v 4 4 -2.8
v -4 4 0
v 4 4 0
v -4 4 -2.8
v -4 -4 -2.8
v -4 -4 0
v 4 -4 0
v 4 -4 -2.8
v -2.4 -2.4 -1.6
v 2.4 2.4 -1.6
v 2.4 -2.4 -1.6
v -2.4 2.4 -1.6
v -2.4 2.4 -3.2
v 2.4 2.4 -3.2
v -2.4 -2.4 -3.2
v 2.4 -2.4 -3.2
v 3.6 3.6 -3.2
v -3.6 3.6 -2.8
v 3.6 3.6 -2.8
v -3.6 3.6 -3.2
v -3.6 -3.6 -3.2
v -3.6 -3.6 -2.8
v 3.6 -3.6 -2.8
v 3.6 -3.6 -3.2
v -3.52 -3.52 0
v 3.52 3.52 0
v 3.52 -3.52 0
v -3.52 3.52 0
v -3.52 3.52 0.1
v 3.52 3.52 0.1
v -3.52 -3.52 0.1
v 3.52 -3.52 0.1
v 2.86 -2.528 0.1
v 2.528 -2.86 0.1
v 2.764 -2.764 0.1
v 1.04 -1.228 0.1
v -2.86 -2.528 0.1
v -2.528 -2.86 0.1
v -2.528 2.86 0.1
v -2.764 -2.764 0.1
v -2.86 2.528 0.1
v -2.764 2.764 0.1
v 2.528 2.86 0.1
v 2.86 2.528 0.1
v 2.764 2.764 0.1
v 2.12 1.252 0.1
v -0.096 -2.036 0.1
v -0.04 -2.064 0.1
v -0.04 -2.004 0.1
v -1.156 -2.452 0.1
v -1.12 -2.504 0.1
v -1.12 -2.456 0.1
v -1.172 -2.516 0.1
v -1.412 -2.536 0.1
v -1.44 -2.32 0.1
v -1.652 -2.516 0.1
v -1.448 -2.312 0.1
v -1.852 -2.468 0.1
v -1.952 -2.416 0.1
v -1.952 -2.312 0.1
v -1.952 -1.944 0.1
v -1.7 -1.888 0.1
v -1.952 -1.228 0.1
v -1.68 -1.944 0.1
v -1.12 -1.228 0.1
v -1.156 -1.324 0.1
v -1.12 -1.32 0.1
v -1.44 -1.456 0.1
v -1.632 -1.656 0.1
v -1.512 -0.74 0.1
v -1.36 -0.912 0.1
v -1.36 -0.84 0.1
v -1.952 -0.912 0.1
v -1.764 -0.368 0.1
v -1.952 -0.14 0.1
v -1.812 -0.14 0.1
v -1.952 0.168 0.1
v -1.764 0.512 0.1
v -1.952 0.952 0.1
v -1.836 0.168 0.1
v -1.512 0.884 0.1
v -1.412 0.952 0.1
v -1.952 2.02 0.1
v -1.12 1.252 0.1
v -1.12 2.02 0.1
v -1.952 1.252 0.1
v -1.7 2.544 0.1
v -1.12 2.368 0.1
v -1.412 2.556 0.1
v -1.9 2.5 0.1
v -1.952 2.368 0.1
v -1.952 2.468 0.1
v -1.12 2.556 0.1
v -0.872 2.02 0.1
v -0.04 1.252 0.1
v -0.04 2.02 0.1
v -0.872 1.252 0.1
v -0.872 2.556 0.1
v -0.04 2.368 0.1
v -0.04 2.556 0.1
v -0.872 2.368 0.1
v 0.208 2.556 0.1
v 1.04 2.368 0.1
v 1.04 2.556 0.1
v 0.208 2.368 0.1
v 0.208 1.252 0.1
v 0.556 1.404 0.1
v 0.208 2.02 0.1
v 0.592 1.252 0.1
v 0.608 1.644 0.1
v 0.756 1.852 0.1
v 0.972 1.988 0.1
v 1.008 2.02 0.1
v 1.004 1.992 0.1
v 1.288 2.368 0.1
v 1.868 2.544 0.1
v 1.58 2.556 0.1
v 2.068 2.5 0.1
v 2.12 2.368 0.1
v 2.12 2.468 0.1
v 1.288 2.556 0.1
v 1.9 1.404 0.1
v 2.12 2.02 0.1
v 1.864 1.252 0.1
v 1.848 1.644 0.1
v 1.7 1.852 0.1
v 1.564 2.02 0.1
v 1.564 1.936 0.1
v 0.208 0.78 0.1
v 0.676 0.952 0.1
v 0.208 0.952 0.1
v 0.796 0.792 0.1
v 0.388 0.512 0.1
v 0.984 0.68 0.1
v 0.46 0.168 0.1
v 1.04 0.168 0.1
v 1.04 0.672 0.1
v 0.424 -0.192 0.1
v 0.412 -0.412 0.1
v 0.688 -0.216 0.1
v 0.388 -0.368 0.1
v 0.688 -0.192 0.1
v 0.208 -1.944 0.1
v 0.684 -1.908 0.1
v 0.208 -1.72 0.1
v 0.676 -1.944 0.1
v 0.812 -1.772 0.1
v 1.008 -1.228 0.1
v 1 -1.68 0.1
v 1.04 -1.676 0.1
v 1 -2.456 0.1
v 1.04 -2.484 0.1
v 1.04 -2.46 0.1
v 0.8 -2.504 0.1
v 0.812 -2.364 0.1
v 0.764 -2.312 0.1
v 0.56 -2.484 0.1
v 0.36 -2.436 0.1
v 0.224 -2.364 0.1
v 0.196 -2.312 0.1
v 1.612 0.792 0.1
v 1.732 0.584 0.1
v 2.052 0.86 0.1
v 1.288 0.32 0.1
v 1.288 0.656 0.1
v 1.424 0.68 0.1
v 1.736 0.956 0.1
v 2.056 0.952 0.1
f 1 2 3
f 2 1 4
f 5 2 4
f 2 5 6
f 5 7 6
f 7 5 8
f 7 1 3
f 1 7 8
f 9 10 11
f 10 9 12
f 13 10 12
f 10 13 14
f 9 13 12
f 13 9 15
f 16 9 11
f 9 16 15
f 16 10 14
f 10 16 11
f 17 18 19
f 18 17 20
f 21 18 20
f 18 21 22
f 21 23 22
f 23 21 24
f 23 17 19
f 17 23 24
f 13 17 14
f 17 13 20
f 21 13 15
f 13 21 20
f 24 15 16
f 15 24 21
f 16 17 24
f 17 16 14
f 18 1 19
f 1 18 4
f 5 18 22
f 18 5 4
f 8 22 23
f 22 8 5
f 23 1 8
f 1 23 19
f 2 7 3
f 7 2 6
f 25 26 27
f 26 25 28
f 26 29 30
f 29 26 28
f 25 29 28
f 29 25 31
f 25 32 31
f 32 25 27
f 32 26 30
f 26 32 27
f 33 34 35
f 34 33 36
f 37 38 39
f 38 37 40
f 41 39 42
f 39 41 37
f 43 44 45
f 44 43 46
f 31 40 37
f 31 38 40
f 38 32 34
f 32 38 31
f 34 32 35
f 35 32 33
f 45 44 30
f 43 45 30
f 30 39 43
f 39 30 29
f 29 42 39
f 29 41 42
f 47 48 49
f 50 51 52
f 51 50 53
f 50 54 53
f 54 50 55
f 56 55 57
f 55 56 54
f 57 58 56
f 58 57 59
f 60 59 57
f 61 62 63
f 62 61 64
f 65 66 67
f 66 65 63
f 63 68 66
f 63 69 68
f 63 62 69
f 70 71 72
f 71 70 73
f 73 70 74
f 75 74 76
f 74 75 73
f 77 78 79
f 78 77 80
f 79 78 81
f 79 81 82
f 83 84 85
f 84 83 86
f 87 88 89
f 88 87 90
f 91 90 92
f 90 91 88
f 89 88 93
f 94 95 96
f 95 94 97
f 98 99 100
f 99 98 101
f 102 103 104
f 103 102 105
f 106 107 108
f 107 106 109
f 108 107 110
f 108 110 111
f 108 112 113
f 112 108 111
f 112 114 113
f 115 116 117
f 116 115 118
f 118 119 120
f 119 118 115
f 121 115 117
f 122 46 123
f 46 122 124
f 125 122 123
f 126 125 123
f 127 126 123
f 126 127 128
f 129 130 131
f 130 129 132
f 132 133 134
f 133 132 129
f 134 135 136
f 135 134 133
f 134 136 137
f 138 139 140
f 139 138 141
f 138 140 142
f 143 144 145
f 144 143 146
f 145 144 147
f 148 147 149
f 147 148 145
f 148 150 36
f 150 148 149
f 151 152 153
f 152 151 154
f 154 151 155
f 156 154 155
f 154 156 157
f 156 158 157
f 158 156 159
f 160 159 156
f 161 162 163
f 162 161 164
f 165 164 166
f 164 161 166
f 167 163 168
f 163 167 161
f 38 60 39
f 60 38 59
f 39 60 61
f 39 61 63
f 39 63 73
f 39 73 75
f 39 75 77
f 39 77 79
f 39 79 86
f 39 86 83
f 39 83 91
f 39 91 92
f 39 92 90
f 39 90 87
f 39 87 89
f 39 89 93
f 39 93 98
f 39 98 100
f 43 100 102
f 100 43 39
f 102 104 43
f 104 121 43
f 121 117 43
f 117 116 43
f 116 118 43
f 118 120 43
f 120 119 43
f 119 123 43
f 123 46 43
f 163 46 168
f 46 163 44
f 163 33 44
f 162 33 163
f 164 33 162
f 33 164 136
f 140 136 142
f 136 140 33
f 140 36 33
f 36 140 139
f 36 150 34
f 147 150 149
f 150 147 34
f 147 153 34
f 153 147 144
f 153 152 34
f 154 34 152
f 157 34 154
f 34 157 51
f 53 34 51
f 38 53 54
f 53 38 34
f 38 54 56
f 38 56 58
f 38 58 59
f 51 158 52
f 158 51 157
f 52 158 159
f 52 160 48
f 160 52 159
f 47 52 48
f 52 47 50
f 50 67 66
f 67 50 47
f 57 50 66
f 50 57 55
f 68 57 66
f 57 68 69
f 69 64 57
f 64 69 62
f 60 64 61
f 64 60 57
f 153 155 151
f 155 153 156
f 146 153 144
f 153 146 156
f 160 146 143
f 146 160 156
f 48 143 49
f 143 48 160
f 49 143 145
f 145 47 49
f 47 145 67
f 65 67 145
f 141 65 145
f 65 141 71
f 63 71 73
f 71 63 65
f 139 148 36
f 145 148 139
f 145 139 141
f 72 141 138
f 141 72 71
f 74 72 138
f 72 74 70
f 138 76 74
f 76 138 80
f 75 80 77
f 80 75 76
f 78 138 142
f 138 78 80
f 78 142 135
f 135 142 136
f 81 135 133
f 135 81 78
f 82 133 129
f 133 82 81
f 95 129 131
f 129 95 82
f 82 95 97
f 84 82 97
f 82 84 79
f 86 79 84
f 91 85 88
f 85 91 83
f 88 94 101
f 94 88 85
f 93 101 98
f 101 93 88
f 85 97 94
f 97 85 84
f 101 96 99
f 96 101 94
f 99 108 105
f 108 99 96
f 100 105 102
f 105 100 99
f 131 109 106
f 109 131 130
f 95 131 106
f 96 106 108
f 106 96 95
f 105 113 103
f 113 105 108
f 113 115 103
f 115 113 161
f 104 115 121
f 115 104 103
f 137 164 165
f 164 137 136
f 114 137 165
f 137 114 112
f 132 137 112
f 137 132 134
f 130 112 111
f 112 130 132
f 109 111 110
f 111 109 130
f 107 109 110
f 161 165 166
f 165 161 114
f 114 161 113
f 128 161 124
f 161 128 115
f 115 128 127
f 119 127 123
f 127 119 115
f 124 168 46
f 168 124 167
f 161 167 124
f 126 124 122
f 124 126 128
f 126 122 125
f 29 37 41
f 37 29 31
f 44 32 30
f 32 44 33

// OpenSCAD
// file: ../p/box5.scad
use <../lib.scad>
function ldraw_lib__box5() = [
// 0 Box with 5 Faces and All Edges
// 0 Name: box5.dat
// 0 Author: James Jessiman
// 0 !LDRAW_ORG Primitive UPDATE 2012-01
// 0 !LICENSE Licensed under CC BY 4.0 : see CAreadme.txt
// 
// 0 BFC CERTIFY CCW
  [0,"BFC","CERTIFY"],
  [0,"BFC","CCW"],
// 
// 0 !HISTORY 2002-04-03 [sbliss] Modified for BFC compliance
// 0 !HISTORY 2002-04-25 [PTadmin] Official Update 2002-02
// 0 !HISTORY 2007-06-24 [PTadmin] Header formatted for Contributor Agreement
// 0 !HISTORY 2008-07-01 [PTadmin] Official Update 2008-01
// 0 !HISTORY 2012-02-16 [Philo] Changed to CCW
// 0 !HISTORY 2012-03-30 [PTadmin] Official Update 2012-01
// 
// 
// 2 24 1 1 1 -1 1 1
  [2,24,1,1,1,-1,1,1],
// 2 24 -1 1 1 -1 1 -1
  [2,24,-1,1,1,-1,1,-1],
// 2 24 -1 1 -1 1 1 -1
  [2,24,-1,1,-1,1,1,-1],
// 2 24 1 1 -1 1 1 1
  [2,24,1,1,-1,1,1,1],
// 2 24 1 0 1 -1 0 1
  [2,24,1,0,1,-1,0,1],
// 2 24 -1 0 1 -1 0 -1
  [2,24,-1,0,1,-1,0,-1],
// 2 24 -1 0 -1 1 0 -1
  [2,24,-1,0,-1,1,0,-1],
// 2 24 1 0 -1 1 0 1
  [2,24,1,0,-1,1,0,1],
// 2 24 1 0 1 1 1 1
  [2,24,1,0,1,1,1,1],
// 2 24 -1 0 1 -1 1 1
  [2,24,-1,0,1,-1,1,1],
// 2 24 1 0 -1 1 1 -1
  [2,24,1,0,-1,1,1,-1],
// 2 24 -1 0 -1 -1 1 -1
  [2,24,-1,0,-1,-1,1,-1],
// 4 16 -1 1 1 1 1 1 1 1 -1 -1 1 -1
  [4,16,-1,1,1,1,1,1,1,1,-1,-1,1,-1],
// 4 16 -1 1 1 -1 0 1 1 0 1 1 1 1
  [4,16,-1,1,1,-1,0,1,1,0,1,1,1,1],
// 4 16 -1 1 -1 -1 0 -1 -1 0 1 -1 1 1
  [4,16,-1,1,-1,-1,0,-1,-1,0,1,-1,1,1],
// 4 16 1 1 -1 1 0 -1 -1 0 -1 -1 1 -1
  [4,16,1,1,-1,1,0,-1,-1,0,-1,-1,1,-1],
// 4 16 1 1 1 1 0 1 1 0 -1 1 1 -1
  [4,16,1,1,1,1,0,1,1,0,-1,1,1,-1],
];
module ldraw_lib__box5(step=0, col=false, unit=2/5, alt=false, line=0.2, solid=!$preview)
    makepoly(ldraw_lib__box5(), step=step, col=col, unit=unit, alt=alt, line=line, solid=solid);
ldraw_lib__box5(line=0.2);
// file: ../p/box4.scad
use <../lib.scad>
function ldraw_lib__box4() = [
// 0 Box with 4 Faces (2 Parallel Pairs) and All Edges
// 0 Name: box4.dat
// 0 Author: James Jessiman
// 0 !LDRAW_ORG Primitive UPDATE 2012-01
// 0 !LICENSE Licensed under CC BY 4.0 : see CAreadme.txt
// 
// 0 BFC CERTIFY CCW
  [0,"BFC","CERTIFY"],
  [0,"BFC","CCW"],
// 
// 0 !HISTORY 2002-04-03 [sbliss] Modified for BFC compliance
// 0 !HISTORY 2002-04-25 [PTadmin] Official Update 2002-02
// 0 !HISTORY 2007-06-24 [PTadmin] Header formatted for Contributor Agreement
// 0 !HISTORY 2008-07-01 [PTadmin] Official Update 2008-01
// 0 !HISTORY 2012-02-16 [Philo] Changed to CCW
// 0 !HISTORY 2012-03-30 [PTadmin] Official Update 2012-01
// 
// 
// 2 24 1 1 1 -1 1 1
  [2,24,1,1,1,-1,1,1],
// 2 24 -1 1 1 -1 1 -1
  [2,24,-1,1,1,-1,1,-1],
// 2 24 -1 1 -1 1 1 -1
  [2,24,-1,1,-1,1,1,-1],
// 2 24 1 1 -1 1 1 1
  [2,24,1,1,-1,1,1,1],
// 2 24 1 0 1 -1 0 1
  [2,24,1,0,1,-1,0,1],
// 2 24 -1 0 1 -1 0 -1
  [2,24,-1,0,1,-1,0,-1],
// 2 24 -1 0 -1 1 0 -1
  [2,24,-1,0,-1,1,0,-1],
// 2 24 1 0 -1 1 0 1
  [2,24,1,0,-1,1,0,1],
// 2 24 1 0 1 1 1 1
  [2,24,1,0,1,1,1,1],
// 2 24 -1 0 1 -1 1 1
  [2,24,-1,0,1,-1,1,1],
// 2 24 1 0 -1 1 1 -1
  [2,24,1,0,-1,1,1,-1],
// 2 24 -1 0 -1 -1 1 -1
  [2,24,-1,0,-1,-1,1,-1],
// 4 16 -1 1 1 -1 0 1 1 0 1 1 1 1
  [4,16,-1,1,1,-1,0,1,1,0,1,1,1,1],
// 4 16 -1 1 -1 -1 0 -1 -1 0 1 -1 1 1
  [4,16,-1,1,-1,-1,0,-1,-1,0,1,-1,1,1],
// 4 16 1 1 -1 1 0 -1 -1 0 -1 -1 1 -1
  [4,16,1,1,-1,1,0,-1,-1,0,-1,-1,1,-1],
// 4 16 1 1 1 1 0 1 1 0 -1 1 1 -1
  [4,16,1,1,1,1,0,1,1,0,-1,1,1,-1],
];
module ldraw_lib__box4(step=0, col=false, unit=2/5, alt=false, line=0.2, solid=!$preview)
    makepoly(ldraw_lib__box4(), step=step, col=col, unit=unit, alt=alt, line=line, solid=solid);
ldraw_lib__box4(line=0.2);
// file: s/3070bs01.scad
use <../../lib.scad>
use <../../p/box4.scad>
use <../../p/box5.scad>
function ldraw_lib__s__3070bs01() = [
// 0 ~Tile  1 x  1 with Groove without Top Face
// 0 Name: s\3070bs01.dat
// 0 Author: Chris Dee [cwdee]
// 0 !LDRAW_ORG Subpart UPDATE 2009-02
// 0 !LICENSE Licensed under CC BY 4.0 : see CAreadme.txt
// 
// 0 BFC CERTIFY CCW
  [0,"BFC","CERTIFY"],
  [0,"BFC","CCW"],
// 
// 0 !HISTORY 2009-09-03 [PTadmin] Official Update 2009-02
// 
// 
// 1 16 0 0 0 10 0 0 0 7 0 0 0 10 box4.dat
  [1,16,0,0,0,10,0,0,0,7,0,0,0,10, ldraw_lib__box4()],
// 0 BFC INVERTNEXT
  [0,"BFC","INVERTNEXT"],
// 1 16 0 8 0 6 0 0 0 -4 0 0 0 6 box5.dat
  [1,16,0,8,0,6,0,0,0,-4,0,0,0,6, ldraw_lib__box5()],
// 1 16 0 7 0 9 0 0 0 1 0 0 0 9 box4.dat
  [1,16,0,7,0,9,0,0,0,1,0,0,0,9, ldraw_lib__box4()],
// 
// 4 16 9 8 9 6 8 6 -6 8 6 -9 8 9
  [4,16,9,8,9,6,8,6,-6,8,6,-9,8,9],
// 4 16 -9 8 9 -6 8 6 -6 8 -6 -9 8 -9
  [4,16,-9,8,9,-6,8,6,-6,8,-6,-9,8,-9],
// 4 16 -9 8 -9 -6 8 -6 6 8 -6 9 8 -9
  [4,16,-9,8,-9,-6,8,-6,6,8,-6,9,8,-9],
// 4 16 9 8 -9 6 8 -6 6 8 6 9 8 9
  [4,16,9,8,-9,6,8,-6,6,8,6,9,8,9],
// 
// 4 16 10 7 10 9 7 9 -9 7 9 -10 7 10
  [4,16,10,7,10,9,7,9,-9,7,9,-10,7,10],
// 4 16 -10 7 10 -9 7 9 -9 7 -9 -10 7 -10
  [4,16,-10,7,10,-9,7,9,-9,7,-9,-10,7,-10],
// 4 16 -10 7 -10 -9 7 -9 9 7 -9 10 7 -10
  [4,16,-10,7,-10,-9,7,-9,9,7,-9,10,7,-10],
// 4 16 10 7 -10 9 7 -9 9 7 9 10 7 10
  [4,16,10,7,-10,9,7,-9,9,7,9,10,7,10],
// 0
];
module ldraw_lib__s__3070bs01(step=0, col=false, unit=2/5, alt=false, line=0.2, solid=!$preview)
    makepoly(ldraw_lib__s__3070bs01(), step=step, col=col, unit=unit, alt=alt, line=line, solid=solid);
ldraw_lib__s__3070bs01(line=0.2);
// file: ../p/box5-12.scad
use <../lib.scad>
function ldraw_lib__box5_12() = [
// 0 Box with 5 Faces without Any Edges
// 0 Name: box5-12.dat
// 0 Author: Chris Dee [cwdee]
// 0 !LDRAW_ORG Primitive UPDATE 2009-02
// 0 !LICENSE Licensed under CC BY 4.0 : see CAreadme.txt
// 
// 0 BFC CERTIFY CCW
  [0,"BFC","CERTIFY"],
  [0,"BFC","CCW"],
// 
// 0 !HISTORY 2009-09-03 [PTadmin] Official Update 2009-02
// 
// 
// 4 16 1 1 1 1 1 -1 -1 1 -1 -1 1 1
  [4,16,1,1,1,1,1,-1,-1,1,-1,-1,1,1],
// 4 16 -1 0 1 1 0 1 1 1 1 -1 1 1
  [4,16,-1,0,1,1,0,1,1,1,1,-1,1,1],
// 4 16 -1 0 -1 -1 0 1 -1 1 1 -1 1 -1
  [4,16,-1,0,-1,-1,0,1,-1,1,1,-1,1,-1],
// 4 16 1 0 -1 -1 0 -1 -1 1 -1 1 1 -1
  [4,16,1,0,-1,-1,0,-1,-1,1,-1,1,1,-1],
// 4 16 1 0 1 1 0 -1 1 1 -1 1 1 1
  [4,16,1,0,1,1,0,-1,1,1,-1,1,1,1],
// 0
];
module ldraw_lib__box5_12(step=0, col=false, unit=2/5, alt=false, line=0.2, solid=!$preview)
    makepoly(ldraw_lib__box5_12(), step=step, col=col, unit=unit, alt=alt, line=line, solid=solid);
ldraw_lib__box5_12(line=0.2);
// file: 3070b.scad
use <../lib.scad>
use <s/3070bs01.scad>
function ldraw_lib__3070b() = [
// 0 Tile  1 x  1 with Groove
// 0 Name: 3070b.dat
// 0 Author: Chris Dee [cwdee]
// 0 !LDRAW_ORG Part UPDATE 2009-02
// 0 !LICENSE Licensed under CC BY 4.0 : see CAreadme.txt
// 
// 0 BFC CERTIFY CW
  [0,"BFC","CERTIFY"],
  [0,"BFC","CW"],
// 
// 0 !HISTORY 2009-09-03 [PTadmin] Official Update 2009-02
// 
// 
// 1 16 0 0 0 1 0 0 0 1 0 0 0 1 s\3070bs01.dat
  [1,16,0,0,0,1,0,0,0,1,0,0,0,1, ldraw_lib__s__3070bs01()],
// 4 16 10 0 10 10 0 -10 -10 0 -10 -10 0 10
  [4,16,10,0,10,10,0,-10,-10,0,-10,-10,0,10],
// 0
];
module ldraw_lib__3070b(step=0, col=false, unit=2/5, alt=false, line=0.2, solid=!$preview)
    makepoly(ldraw_lib__3070b(), step=step, col=col, unit=unit, alt=alt, line=line, solid=solid);
ldraw_lib__3070b(line=0.2);
// main file
use <../lib.scad>
use <168365d.scad>
use <3070b.scad>
function ldraw_lib__3070bd01() = [
// 0 Tile  1 x  1 with Light Grey Stripes on White Background with Reflection Areas with Black Border Sticker
// 0 Name: 3070bd01.dat
// 0 Author: Chris Böhnke [KnightOfTarenta]
// 0 !LDRAW_ORG Shortcut UPDATE 2025-02
// 0 !LICENSE Licensed under CC BY 4.0 : see CAreadme.txt
// 
// 0 BFC CERTIFY CCW
  [0,"BFC","CERTIFY"],
  [0,"BFC","CCW"],
// 
// 0 !CATEGORY Sticker Shortcut
// 0 !KEYWORDS Bricklink 3070pb040, BrickOwl 387244, headlight, Rebel Wrecker
// 0 !KEYWORDS Set 8858, Technic
// 
// 0 !HISTORY 2025-02-27 [OrionP] Official Update 2025-02
// 
// 1 16 0 0 0 1 0 0 0 1 0 0 0 1 3070b.dat
  [1,16,0,0,0,1,0,0,0,1,0,0,0,1, ldraw_lib__3070b()],
// 1 16 0 0 0 1 0 0 0 1 0 0 0 1 168365d.dat
  [1,16,0,0,0,1,0,0,0,1,0,0,0,1, ldraw_lib__168365d()],
];
module ldraw_lib__3070bd01(step=0, col=false, unit=2/5, alt=false, line=0.2, solid=!$preview)
    makepoly(ldraw_lib__3070bd01(), step=step, col=col, unit=unit, alt=alt, line=line, solid=solid);
ldraw_lib__3070bd01(line=0.2);
